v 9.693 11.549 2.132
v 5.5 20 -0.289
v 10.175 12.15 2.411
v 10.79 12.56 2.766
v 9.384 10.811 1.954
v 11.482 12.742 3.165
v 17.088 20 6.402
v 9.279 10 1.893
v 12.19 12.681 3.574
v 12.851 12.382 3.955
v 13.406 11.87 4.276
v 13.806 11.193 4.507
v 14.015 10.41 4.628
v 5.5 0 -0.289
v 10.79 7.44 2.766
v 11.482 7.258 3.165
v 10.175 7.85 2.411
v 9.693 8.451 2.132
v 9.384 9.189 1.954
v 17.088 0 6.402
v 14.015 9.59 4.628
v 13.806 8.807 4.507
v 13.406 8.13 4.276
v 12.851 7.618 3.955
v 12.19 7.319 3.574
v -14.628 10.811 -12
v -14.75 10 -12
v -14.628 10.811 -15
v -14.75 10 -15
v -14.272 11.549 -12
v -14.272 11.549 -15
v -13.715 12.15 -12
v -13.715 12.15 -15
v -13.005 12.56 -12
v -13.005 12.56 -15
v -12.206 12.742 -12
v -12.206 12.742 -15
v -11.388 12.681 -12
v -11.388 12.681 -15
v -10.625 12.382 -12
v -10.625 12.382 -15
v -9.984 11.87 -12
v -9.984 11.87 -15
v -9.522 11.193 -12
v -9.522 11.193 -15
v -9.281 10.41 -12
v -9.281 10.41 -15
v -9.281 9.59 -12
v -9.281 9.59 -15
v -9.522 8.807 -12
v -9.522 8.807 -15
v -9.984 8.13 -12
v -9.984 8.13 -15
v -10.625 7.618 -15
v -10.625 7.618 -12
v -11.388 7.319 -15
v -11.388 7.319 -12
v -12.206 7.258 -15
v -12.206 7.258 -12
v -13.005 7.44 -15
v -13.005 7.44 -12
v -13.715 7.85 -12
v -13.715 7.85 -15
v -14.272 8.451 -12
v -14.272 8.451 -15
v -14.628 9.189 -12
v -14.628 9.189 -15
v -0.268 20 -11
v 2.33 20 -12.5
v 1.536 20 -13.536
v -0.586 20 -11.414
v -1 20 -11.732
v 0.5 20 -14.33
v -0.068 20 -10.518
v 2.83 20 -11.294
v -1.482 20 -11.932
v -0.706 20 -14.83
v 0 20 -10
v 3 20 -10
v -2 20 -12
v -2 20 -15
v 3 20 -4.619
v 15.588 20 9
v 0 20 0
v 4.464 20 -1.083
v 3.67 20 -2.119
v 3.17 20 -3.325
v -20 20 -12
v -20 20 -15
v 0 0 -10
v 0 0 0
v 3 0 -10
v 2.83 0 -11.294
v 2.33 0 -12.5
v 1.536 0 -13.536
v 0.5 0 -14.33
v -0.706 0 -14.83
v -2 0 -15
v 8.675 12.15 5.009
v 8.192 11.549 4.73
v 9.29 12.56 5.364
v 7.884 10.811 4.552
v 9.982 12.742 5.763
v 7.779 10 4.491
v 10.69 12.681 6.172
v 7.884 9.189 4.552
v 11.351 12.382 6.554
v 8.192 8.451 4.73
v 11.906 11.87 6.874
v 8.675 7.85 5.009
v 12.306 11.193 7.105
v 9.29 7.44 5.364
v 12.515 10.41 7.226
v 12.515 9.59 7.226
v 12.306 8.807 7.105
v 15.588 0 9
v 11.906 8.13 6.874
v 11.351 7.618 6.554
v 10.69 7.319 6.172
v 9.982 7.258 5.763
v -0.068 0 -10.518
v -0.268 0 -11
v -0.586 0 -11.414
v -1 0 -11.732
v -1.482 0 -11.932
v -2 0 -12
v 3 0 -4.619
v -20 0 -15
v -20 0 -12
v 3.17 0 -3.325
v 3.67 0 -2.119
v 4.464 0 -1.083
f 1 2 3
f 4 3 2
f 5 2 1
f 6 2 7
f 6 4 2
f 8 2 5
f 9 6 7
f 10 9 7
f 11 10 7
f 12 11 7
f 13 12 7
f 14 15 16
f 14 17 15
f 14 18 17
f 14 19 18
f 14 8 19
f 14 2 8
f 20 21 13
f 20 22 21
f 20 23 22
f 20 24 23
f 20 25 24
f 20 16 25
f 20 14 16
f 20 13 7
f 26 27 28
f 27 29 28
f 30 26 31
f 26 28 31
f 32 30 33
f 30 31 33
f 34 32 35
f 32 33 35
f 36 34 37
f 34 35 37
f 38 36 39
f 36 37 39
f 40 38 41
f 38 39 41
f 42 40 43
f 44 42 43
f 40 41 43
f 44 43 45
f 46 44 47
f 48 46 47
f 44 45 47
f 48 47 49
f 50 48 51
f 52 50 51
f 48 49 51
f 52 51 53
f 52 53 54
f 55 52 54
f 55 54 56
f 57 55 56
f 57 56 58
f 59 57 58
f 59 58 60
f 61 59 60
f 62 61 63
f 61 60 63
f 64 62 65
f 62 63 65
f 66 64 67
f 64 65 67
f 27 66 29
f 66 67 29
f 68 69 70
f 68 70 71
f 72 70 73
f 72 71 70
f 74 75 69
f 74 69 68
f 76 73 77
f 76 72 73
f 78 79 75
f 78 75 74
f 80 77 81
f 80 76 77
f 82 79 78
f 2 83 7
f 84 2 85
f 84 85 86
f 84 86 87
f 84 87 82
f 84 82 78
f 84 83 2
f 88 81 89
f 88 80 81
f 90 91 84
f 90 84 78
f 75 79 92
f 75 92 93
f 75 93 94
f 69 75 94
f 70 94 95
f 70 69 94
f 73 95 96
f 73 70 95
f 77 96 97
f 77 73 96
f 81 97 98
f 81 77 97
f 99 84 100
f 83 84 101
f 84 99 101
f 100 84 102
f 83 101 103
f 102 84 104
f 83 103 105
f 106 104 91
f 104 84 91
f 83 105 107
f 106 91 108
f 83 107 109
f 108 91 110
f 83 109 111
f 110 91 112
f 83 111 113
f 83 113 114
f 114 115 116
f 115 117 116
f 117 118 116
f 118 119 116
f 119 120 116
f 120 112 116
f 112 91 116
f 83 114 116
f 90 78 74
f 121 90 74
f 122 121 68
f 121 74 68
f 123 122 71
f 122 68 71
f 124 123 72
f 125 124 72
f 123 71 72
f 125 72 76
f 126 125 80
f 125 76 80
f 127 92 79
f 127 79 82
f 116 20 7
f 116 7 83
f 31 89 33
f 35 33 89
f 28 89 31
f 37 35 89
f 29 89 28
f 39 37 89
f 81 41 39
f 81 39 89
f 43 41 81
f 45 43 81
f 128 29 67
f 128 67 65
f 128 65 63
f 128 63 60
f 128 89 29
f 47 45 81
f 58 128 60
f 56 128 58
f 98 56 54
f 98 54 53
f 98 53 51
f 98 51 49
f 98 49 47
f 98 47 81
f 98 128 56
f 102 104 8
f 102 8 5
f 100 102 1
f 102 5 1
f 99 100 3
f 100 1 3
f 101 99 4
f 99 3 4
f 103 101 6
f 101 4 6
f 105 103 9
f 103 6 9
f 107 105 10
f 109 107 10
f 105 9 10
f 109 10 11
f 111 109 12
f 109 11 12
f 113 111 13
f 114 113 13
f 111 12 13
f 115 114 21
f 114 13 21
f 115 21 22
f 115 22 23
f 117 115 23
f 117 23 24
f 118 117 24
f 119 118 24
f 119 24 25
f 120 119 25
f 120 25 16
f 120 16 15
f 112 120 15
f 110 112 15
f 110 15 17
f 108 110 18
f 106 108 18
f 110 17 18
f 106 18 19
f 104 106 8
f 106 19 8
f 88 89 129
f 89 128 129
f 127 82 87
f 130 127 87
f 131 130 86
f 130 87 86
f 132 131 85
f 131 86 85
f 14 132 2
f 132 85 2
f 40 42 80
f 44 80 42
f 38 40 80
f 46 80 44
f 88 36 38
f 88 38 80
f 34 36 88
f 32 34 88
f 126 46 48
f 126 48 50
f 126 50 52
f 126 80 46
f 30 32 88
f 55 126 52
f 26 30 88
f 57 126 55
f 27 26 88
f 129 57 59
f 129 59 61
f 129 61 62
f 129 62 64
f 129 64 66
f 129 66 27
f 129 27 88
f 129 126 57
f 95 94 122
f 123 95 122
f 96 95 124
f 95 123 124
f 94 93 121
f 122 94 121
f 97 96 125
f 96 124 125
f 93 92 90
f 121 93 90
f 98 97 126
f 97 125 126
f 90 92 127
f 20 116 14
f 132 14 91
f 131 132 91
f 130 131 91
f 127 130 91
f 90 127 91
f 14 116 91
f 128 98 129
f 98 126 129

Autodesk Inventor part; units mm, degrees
ref_plane "YZ Plane" through (0, 0, 0) normal (1, 0, 0) x (0, 1, 0)
ref_plane "XZ Plane" through (0, 0, 0) normal (0, 1, 0) x (-1, 0, 0)
ref_plane "XY Plane" through (0, 0, 0) normal (0, 0, 1) x (1, 0, 0)
sketch "Sketch4" plane through (0, 0, 0) normal (0, 1, 0) x (-1, 0, 0)
  line L0 (0, 0) -> (0, -12)
  line L1 (0, -12) -> (20, -12)
  line L2 (20, -12) -> (0, -12)
  line L3 (0, -12) -> (0, -15)
  line L4 (0, -15) -> (20, -15)
  line L5 (20, -15) -> (20, -12)
  line L6 (0, 0) -> (-15.5885, 9)
  line L7 (0, 0) -> (18, 0) construction
  line L8 (-15.5885, 9) -> (0, 0)
  line L9 (0, 0) -> (-1.5, -2.5981)
  line L10 (-1.5, -2.5981) -> (-17.0885, 6.4019)
  line L11 (-17.0885, 6.4019) -> (-15.5885, 9)
  line L12 (0, 0) -> (0, -15)
  line L13 (0, -15) -> (-3, -15)
  line L14 (-3, -15) -> (-3, 0)
  line L15 (-3, 0) -> (0, 0)
  dimension "d16" = 12
  dimension "d17" = 20
  dimension "d18" = 3
  dimension "d19" = 18
  dimension "d20" = 150
  dimension "d21" = 3
  dimension "d24" = 3
extrude "Extrusion5" add sketch "Sketch4" along normal blind 20
sketch "Sketch5" plane through (3, 0, -15) normal (0, 0, -1) x (-1, 0, 0)
  line L0 (15, 0) -> (15, 10)
  circle A0 centre (15, 10) radius 2.75
  line L1 (0, 0) -> (0, 20) projected
  dimension "d27" = 10
  dimension "d28" = 5.5
  dimension "d36" = 15
extrude "Extrusion6" cut sketch "Sketch5" against normal blind 3
sketch "Sketch6" plane through (3, 0, -1.7321) normal (0.5, 0, -0.866) x (-0.866, 0, -0.5)
  line L0 (0, 0) -> (0, 20) projected
  line L1 (0, 10) -> (-10, 10)
  circle A0 centre (-10, 10) radius 2.75
  point P0 (1.7321, 0)
  dimension "d31" = 10
  dimension "d32" = 5.5
extrude "Extrusion7" cut sketch "Sketch6" against normal blind 3
fillet "Fillet1" radius 5 2 edges at (3, 10, -1.7321) (3, 10, -15)
fillet "Fillet2" radius 2 1 edges at (0, 10, -12)
properties part number "Acrylic_angle_bracket"
